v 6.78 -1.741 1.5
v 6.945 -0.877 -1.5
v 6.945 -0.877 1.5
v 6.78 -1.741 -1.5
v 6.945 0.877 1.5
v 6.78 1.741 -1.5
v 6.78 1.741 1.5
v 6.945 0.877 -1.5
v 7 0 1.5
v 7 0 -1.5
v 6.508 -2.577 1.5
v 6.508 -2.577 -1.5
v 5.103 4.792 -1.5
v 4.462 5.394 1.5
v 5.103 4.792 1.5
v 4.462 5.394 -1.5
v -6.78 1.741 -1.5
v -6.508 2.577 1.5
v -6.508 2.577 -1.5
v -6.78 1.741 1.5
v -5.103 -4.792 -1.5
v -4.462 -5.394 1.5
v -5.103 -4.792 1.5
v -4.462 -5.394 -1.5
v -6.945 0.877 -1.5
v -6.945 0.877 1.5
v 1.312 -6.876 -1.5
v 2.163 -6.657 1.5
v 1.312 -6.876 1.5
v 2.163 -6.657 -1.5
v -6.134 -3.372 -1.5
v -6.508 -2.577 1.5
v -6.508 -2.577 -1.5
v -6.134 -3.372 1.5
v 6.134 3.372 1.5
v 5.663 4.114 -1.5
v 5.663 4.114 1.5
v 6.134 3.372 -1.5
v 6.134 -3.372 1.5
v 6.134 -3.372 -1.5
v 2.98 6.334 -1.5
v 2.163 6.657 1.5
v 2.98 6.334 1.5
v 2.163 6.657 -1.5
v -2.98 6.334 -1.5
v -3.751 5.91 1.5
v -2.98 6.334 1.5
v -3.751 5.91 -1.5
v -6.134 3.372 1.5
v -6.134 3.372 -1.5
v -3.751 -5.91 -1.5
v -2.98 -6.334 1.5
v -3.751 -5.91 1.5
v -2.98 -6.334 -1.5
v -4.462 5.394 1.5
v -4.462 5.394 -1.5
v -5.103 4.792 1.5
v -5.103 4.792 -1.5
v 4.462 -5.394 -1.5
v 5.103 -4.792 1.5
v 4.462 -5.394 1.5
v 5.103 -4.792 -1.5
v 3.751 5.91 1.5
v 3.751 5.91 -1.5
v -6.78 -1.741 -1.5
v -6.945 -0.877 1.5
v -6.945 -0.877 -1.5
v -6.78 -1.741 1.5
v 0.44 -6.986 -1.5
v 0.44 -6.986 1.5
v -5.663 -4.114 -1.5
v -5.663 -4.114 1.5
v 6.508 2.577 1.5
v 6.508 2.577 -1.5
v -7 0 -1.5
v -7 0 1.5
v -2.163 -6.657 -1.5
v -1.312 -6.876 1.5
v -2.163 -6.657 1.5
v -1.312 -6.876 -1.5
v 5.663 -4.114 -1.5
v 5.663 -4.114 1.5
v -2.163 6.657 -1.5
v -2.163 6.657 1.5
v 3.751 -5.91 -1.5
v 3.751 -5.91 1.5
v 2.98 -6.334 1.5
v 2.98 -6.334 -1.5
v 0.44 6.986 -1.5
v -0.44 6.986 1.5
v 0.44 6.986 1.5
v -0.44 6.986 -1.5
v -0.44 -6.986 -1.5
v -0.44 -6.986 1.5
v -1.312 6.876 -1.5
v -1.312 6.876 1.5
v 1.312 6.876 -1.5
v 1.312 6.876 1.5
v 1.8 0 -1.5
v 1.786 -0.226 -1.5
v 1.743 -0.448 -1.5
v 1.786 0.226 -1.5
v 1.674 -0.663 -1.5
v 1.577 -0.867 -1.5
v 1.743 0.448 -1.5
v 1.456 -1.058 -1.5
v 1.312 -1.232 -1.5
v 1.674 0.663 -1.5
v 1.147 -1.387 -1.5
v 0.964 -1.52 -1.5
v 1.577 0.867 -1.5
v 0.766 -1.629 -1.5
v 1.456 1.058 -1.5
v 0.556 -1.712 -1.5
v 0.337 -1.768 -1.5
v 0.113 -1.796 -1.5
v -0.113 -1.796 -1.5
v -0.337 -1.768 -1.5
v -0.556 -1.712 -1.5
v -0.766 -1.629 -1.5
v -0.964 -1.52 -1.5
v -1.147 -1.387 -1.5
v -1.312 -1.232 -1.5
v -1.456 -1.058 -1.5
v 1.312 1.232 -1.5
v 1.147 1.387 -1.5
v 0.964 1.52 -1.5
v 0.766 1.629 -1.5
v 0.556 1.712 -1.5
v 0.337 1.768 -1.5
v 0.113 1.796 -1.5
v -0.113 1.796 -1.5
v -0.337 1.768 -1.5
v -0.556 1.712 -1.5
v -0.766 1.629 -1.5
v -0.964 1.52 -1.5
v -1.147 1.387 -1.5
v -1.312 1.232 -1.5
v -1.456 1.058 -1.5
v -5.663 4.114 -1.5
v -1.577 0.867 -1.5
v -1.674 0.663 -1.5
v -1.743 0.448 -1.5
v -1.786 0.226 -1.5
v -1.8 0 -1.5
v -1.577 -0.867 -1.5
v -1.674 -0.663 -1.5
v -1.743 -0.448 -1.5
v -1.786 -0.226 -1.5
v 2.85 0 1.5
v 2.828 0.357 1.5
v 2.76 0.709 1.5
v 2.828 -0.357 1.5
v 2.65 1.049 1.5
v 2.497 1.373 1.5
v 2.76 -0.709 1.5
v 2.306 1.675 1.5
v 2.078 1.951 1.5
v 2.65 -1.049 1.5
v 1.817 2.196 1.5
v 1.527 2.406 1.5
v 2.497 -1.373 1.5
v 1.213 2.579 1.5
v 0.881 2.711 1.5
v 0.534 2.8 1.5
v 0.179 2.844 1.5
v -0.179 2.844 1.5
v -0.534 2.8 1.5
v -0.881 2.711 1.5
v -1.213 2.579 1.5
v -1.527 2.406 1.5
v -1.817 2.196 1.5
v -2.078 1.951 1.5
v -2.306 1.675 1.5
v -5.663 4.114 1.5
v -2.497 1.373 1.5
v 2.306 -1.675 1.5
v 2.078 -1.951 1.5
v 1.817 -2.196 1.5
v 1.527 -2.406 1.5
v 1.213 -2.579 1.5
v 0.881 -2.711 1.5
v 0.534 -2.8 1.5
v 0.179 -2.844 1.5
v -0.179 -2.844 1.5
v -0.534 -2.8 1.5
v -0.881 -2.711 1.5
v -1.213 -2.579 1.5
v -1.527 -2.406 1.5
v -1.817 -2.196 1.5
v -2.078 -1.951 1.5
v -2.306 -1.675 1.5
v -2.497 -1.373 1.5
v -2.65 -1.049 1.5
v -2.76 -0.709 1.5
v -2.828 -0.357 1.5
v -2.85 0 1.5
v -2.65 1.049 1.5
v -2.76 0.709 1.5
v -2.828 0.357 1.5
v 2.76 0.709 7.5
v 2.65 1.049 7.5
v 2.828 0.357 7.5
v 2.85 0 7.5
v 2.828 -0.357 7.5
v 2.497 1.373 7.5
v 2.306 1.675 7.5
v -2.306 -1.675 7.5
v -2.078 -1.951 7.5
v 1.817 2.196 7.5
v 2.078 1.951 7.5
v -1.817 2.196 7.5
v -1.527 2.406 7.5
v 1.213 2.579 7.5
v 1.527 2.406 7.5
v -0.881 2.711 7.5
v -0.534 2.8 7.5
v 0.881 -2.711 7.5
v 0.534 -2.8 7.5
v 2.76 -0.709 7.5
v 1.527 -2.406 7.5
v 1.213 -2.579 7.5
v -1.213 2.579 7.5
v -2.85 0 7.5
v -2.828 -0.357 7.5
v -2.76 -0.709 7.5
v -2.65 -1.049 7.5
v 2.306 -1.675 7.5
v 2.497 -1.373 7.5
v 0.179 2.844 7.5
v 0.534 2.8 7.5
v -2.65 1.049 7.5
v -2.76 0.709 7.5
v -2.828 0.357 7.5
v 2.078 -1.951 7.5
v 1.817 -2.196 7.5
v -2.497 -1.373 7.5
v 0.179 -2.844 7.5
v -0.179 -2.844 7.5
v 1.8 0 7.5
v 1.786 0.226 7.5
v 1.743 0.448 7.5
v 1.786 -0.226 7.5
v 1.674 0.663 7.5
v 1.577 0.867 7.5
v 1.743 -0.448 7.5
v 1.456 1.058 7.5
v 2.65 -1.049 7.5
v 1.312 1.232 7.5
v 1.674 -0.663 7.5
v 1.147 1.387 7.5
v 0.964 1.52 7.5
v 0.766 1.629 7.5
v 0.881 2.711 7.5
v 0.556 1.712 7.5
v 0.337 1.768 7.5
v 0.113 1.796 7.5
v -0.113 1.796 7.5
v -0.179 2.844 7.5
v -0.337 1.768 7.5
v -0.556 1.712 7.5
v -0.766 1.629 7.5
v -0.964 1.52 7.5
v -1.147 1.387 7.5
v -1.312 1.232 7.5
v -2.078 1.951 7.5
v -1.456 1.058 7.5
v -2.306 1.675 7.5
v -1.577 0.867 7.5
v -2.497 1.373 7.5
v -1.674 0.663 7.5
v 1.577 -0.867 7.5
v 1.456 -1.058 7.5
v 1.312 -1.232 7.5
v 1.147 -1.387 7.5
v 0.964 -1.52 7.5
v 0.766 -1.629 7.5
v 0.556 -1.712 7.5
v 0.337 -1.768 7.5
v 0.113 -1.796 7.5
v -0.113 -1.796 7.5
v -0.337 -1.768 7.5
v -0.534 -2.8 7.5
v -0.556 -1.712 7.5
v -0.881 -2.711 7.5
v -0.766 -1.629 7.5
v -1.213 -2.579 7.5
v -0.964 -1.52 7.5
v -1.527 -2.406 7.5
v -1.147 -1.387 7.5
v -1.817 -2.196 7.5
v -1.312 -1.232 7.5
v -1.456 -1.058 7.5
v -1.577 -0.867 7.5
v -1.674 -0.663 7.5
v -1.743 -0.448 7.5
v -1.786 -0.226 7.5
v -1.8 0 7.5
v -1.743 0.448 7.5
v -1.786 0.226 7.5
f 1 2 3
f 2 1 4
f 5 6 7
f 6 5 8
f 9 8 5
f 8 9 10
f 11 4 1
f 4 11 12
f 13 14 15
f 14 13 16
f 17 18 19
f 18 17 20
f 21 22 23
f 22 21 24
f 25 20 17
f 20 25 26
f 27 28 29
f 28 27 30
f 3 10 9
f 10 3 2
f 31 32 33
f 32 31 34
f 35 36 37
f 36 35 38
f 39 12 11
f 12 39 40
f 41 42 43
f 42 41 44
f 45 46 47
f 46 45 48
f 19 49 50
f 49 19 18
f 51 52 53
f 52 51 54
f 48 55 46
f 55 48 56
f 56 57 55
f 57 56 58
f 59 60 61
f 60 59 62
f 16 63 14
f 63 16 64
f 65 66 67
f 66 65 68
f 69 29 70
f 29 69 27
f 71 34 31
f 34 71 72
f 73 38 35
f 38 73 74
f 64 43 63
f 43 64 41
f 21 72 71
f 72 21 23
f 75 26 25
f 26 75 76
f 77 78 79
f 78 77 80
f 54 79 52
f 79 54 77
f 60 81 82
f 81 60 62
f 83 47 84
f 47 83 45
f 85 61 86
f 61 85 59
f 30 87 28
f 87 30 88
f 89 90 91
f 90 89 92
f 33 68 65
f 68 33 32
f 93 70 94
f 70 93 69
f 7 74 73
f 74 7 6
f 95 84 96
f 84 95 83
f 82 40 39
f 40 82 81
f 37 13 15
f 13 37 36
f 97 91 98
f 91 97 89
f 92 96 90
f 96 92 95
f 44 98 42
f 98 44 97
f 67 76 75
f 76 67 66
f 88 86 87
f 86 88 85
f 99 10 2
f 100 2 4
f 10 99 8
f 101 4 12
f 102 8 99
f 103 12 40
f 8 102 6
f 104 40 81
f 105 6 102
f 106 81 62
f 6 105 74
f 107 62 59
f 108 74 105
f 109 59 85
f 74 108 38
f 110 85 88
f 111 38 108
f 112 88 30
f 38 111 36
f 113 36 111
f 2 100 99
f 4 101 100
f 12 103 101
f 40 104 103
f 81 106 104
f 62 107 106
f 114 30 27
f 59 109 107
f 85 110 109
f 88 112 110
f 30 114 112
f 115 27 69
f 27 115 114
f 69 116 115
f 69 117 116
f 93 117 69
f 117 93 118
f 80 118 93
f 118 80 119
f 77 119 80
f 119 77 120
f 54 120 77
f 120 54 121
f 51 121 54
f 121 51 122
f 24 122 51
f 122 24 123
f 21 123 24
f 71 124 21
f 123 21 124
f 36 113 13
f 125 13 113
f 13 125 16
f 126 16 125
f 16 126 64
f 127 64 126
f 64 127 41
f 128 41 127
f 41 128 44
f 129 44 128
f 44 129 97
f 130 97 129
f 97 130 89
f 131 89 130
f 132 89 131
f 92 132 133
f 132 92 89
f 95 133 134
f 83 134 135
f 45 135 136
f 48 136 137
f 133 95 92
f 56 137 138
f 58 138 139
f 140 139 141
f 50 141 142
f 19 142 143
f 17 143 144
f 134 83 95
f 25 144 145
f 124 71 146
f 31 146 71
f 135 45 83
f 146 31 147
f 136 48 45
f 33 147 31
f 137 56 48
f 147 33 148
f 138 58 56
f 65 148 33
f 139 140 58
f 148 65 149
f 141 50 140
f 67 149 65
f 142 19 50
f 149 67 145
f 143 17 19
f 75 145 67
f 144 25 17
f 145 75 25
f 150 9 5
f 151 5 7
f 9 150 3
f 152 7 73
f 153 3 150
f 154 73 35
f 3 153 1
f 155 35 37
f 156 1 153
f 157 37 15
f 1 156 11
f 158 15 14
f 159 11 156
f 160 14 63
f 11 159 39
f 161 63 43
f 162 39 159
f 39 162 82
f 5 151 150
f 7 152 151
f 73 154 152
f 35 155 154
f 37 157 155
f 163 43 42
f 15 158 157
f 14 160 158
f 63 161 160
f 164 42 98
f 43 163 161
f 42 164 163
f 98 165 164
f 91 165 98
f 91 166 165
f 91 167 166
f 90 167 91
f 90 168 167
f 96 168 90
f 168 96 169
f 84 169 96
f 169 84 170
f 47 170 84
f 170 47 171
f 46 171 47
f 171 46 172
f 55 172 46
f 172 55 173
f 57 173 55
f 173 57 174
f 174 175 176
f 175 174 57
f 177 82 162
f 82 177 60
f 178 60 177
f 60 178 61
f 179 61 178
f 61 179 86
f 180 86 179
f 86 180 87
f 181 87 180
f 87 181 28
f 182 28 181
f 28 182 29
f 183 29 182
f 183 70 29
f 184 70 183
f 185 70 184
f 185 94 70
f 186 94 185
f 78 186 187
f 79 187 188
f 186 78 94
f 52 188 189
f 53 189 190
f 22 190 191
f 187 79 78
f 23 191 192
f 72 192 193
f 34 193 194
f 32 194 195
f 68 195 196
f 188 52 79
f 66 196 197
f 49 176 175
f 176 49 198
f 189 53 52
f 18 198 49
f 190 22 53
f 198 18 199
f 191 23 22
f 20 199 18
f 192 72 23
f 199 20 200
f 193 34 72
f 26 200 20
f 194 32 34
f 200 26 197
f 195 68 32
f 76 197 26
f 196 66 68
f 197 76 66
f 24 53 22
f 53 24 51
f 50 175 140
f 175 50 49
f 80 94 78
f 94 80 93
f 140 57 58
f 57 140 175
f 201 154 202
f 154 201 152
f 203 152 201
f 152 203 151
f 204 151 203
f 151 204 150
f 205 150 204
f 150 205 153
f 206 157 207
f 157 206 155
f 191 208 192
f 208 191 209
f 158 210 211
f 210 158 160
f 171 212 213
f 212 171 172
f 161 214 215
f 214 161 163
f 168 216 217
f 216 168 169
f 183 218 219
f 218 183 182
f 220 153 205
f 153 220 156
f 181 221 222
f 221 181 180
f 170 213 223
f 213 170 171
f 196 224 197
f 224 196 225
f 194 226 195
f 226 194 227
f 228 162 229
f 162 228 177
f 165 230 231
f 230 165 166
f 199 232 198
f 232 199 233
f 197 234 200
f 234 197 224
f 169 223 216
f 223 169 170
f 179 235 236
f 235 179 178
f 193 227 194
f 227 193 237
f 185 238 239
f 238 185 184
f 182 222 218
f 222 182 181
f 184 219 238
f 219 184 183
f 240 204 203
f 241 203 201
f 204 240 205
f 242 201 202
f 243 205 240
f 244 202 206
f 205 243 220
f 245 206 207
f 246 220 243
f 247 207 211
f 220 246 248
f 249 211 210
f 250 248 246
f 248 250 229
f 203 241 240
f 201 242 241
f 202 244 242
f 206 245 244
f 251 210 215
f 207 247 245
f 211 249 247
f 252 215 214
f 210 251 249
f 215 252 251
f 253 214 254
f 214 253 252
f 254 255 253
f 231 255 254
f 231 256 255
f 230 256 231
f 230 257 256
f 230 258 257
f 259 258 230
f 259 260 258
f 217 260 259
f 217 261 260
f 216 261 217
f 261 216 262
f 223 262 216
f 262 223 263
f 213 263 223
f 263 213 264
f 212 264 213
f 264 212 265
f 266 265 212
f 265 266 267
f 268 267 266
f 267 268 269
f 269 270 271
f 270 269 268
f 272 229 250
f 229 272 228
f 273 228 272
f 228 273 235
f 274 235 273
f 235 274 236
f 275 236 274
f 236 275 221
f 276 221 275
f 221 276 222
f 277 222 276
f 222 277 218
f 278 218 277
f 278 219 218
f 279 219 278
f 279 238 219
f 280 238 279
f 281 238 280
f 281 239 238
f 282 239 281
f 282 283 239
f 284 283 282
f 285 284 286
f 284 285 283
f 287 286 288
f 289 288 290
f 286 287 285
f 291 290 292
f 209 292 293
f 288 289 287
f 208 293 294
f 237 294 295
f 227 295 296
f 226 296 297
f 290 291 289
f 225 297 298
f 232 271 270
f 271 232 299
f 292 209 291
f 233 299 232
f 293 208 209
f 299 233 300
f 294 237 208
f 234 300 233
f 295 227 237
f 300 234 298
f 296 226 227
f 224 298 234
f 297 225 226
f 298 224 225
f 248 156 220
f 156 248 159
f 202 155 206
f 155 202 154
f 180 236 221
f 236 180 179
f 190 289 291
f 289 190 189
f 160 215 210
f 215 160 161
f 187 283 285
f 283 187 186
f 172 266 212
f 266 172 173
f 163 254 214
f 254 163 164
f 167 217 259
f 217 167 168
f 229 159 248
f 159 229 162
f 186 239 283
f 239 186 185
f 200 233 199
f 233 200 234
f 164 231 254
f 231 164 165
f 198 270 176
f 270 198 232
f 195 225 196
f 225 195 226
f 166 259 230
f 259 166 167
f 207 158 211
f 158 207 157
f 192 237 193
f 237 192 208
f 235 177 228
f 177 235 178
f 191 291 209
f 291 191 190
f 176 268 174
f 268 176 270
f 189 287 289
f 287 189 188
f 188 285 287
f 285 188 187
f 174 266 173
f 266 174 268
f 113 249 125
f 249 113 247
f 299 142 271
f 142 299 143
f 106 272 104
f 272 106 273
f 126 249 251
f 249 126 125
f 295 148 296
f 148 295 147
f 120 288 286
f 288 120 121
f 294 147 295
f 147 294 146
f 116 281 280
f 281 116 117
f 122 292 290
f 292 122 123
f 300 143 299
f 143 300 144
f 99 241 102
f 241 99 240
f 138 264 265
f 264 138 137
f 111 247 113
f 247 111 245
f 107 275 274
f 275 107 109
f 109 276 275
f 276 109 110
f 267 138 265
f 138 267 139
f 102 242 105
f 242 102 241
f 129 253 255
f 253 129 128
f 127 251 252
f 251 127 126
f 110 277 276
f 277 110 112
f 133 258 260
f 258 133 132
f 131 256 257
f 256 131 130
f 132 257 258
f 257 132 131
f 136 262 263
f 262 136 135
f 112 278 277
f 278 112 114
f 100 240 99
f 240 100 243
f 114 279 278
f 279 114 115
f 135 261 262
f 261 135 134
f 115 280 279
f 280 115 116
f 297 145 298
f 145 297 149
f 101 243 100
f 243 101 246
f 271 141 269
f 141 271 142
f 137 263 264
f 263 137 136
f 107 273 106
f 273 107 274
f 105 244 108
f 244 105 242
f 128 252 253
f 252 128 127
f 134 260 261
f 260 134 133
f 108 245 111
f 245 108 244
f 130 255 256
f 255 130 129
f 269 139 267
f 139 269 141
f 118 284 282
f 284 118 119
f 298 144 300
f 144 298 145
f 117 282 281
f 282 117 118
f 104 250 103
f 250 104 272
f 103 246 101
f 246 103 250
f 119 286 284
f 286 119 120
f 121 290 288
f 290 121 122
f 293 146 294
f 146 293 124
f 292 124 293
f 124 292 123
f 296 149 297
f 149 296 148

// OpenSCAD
$fn = 50;


difference() {
	union() {
		translate(v = [0, 0, -1.5000000000]) {
			cylinder(h = 3, r = 7.0000000000);
		}
		translate(v = [0, 0, -1.5000000000]) {
			cylinder(h = 9, r = 2.8500000000);
		}
	}
	union() {
		translate(v = [0, 0, -50.0000000000]) {
			cylinder(h = 100, r = 1.8000000000);
		}
	}
}
